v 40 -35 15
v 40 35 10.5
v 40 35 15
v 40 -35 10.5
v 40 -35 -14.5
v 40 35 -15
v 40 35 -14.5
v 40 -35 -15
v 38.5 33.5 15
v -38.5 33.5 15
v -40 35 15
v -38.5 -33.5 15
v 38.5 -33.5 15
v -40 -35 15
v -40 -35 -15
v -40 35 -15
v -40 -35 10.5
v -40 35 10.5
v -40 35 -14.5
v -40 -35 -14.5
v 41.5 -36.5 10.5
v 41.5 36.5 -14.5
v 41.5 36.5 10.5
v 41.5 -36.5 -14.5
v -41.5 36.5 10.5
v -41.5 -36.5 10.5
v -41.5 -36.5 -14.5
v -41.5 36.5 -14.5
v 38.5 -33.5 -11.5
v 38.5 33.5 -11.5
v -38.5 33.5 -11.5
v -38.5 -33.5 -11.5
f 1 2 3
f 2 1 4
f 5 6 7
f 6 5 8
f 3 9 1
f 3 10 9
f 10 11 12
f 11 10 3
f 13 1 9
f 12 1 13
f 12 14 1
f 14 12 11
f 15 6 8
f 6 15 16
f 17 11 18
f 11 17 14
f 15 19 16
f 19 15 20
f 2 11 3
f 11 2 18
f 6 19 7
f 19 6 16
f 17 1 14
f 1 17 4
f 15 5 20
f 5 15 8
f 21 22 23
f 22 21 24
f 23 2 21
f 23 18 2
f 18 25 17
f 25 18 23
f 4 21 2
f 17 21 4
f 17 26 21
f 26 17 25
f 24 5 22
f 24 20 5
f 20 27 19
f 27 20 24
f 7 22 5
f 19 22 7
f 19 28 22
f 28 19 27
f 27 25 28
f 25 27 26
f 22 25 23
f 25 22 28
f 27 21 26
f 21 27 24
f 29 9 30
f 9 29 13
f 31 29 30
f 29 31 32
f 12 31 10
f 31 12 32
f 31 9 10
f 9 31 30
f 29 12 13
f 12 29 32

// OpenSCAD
sizex  = 80;
sizey  = 70;
sizeh  = 30;
wall   = 3;
dewall = 5;
base   = 2;

lidh   = 10;
tolerance = 0.3;

difference() {
  union(){
    cube([sizex,sizey,sizeh], center = true);
    translate([0,0,-base]) {
      cube([sizex+wall,sizey+wall,sizeh-dewall], center = true);
    }
  }
  translate([0,0,base]) {cube([sizex-wall,sizey-wall,sizeh-wall], center = true);}
}
